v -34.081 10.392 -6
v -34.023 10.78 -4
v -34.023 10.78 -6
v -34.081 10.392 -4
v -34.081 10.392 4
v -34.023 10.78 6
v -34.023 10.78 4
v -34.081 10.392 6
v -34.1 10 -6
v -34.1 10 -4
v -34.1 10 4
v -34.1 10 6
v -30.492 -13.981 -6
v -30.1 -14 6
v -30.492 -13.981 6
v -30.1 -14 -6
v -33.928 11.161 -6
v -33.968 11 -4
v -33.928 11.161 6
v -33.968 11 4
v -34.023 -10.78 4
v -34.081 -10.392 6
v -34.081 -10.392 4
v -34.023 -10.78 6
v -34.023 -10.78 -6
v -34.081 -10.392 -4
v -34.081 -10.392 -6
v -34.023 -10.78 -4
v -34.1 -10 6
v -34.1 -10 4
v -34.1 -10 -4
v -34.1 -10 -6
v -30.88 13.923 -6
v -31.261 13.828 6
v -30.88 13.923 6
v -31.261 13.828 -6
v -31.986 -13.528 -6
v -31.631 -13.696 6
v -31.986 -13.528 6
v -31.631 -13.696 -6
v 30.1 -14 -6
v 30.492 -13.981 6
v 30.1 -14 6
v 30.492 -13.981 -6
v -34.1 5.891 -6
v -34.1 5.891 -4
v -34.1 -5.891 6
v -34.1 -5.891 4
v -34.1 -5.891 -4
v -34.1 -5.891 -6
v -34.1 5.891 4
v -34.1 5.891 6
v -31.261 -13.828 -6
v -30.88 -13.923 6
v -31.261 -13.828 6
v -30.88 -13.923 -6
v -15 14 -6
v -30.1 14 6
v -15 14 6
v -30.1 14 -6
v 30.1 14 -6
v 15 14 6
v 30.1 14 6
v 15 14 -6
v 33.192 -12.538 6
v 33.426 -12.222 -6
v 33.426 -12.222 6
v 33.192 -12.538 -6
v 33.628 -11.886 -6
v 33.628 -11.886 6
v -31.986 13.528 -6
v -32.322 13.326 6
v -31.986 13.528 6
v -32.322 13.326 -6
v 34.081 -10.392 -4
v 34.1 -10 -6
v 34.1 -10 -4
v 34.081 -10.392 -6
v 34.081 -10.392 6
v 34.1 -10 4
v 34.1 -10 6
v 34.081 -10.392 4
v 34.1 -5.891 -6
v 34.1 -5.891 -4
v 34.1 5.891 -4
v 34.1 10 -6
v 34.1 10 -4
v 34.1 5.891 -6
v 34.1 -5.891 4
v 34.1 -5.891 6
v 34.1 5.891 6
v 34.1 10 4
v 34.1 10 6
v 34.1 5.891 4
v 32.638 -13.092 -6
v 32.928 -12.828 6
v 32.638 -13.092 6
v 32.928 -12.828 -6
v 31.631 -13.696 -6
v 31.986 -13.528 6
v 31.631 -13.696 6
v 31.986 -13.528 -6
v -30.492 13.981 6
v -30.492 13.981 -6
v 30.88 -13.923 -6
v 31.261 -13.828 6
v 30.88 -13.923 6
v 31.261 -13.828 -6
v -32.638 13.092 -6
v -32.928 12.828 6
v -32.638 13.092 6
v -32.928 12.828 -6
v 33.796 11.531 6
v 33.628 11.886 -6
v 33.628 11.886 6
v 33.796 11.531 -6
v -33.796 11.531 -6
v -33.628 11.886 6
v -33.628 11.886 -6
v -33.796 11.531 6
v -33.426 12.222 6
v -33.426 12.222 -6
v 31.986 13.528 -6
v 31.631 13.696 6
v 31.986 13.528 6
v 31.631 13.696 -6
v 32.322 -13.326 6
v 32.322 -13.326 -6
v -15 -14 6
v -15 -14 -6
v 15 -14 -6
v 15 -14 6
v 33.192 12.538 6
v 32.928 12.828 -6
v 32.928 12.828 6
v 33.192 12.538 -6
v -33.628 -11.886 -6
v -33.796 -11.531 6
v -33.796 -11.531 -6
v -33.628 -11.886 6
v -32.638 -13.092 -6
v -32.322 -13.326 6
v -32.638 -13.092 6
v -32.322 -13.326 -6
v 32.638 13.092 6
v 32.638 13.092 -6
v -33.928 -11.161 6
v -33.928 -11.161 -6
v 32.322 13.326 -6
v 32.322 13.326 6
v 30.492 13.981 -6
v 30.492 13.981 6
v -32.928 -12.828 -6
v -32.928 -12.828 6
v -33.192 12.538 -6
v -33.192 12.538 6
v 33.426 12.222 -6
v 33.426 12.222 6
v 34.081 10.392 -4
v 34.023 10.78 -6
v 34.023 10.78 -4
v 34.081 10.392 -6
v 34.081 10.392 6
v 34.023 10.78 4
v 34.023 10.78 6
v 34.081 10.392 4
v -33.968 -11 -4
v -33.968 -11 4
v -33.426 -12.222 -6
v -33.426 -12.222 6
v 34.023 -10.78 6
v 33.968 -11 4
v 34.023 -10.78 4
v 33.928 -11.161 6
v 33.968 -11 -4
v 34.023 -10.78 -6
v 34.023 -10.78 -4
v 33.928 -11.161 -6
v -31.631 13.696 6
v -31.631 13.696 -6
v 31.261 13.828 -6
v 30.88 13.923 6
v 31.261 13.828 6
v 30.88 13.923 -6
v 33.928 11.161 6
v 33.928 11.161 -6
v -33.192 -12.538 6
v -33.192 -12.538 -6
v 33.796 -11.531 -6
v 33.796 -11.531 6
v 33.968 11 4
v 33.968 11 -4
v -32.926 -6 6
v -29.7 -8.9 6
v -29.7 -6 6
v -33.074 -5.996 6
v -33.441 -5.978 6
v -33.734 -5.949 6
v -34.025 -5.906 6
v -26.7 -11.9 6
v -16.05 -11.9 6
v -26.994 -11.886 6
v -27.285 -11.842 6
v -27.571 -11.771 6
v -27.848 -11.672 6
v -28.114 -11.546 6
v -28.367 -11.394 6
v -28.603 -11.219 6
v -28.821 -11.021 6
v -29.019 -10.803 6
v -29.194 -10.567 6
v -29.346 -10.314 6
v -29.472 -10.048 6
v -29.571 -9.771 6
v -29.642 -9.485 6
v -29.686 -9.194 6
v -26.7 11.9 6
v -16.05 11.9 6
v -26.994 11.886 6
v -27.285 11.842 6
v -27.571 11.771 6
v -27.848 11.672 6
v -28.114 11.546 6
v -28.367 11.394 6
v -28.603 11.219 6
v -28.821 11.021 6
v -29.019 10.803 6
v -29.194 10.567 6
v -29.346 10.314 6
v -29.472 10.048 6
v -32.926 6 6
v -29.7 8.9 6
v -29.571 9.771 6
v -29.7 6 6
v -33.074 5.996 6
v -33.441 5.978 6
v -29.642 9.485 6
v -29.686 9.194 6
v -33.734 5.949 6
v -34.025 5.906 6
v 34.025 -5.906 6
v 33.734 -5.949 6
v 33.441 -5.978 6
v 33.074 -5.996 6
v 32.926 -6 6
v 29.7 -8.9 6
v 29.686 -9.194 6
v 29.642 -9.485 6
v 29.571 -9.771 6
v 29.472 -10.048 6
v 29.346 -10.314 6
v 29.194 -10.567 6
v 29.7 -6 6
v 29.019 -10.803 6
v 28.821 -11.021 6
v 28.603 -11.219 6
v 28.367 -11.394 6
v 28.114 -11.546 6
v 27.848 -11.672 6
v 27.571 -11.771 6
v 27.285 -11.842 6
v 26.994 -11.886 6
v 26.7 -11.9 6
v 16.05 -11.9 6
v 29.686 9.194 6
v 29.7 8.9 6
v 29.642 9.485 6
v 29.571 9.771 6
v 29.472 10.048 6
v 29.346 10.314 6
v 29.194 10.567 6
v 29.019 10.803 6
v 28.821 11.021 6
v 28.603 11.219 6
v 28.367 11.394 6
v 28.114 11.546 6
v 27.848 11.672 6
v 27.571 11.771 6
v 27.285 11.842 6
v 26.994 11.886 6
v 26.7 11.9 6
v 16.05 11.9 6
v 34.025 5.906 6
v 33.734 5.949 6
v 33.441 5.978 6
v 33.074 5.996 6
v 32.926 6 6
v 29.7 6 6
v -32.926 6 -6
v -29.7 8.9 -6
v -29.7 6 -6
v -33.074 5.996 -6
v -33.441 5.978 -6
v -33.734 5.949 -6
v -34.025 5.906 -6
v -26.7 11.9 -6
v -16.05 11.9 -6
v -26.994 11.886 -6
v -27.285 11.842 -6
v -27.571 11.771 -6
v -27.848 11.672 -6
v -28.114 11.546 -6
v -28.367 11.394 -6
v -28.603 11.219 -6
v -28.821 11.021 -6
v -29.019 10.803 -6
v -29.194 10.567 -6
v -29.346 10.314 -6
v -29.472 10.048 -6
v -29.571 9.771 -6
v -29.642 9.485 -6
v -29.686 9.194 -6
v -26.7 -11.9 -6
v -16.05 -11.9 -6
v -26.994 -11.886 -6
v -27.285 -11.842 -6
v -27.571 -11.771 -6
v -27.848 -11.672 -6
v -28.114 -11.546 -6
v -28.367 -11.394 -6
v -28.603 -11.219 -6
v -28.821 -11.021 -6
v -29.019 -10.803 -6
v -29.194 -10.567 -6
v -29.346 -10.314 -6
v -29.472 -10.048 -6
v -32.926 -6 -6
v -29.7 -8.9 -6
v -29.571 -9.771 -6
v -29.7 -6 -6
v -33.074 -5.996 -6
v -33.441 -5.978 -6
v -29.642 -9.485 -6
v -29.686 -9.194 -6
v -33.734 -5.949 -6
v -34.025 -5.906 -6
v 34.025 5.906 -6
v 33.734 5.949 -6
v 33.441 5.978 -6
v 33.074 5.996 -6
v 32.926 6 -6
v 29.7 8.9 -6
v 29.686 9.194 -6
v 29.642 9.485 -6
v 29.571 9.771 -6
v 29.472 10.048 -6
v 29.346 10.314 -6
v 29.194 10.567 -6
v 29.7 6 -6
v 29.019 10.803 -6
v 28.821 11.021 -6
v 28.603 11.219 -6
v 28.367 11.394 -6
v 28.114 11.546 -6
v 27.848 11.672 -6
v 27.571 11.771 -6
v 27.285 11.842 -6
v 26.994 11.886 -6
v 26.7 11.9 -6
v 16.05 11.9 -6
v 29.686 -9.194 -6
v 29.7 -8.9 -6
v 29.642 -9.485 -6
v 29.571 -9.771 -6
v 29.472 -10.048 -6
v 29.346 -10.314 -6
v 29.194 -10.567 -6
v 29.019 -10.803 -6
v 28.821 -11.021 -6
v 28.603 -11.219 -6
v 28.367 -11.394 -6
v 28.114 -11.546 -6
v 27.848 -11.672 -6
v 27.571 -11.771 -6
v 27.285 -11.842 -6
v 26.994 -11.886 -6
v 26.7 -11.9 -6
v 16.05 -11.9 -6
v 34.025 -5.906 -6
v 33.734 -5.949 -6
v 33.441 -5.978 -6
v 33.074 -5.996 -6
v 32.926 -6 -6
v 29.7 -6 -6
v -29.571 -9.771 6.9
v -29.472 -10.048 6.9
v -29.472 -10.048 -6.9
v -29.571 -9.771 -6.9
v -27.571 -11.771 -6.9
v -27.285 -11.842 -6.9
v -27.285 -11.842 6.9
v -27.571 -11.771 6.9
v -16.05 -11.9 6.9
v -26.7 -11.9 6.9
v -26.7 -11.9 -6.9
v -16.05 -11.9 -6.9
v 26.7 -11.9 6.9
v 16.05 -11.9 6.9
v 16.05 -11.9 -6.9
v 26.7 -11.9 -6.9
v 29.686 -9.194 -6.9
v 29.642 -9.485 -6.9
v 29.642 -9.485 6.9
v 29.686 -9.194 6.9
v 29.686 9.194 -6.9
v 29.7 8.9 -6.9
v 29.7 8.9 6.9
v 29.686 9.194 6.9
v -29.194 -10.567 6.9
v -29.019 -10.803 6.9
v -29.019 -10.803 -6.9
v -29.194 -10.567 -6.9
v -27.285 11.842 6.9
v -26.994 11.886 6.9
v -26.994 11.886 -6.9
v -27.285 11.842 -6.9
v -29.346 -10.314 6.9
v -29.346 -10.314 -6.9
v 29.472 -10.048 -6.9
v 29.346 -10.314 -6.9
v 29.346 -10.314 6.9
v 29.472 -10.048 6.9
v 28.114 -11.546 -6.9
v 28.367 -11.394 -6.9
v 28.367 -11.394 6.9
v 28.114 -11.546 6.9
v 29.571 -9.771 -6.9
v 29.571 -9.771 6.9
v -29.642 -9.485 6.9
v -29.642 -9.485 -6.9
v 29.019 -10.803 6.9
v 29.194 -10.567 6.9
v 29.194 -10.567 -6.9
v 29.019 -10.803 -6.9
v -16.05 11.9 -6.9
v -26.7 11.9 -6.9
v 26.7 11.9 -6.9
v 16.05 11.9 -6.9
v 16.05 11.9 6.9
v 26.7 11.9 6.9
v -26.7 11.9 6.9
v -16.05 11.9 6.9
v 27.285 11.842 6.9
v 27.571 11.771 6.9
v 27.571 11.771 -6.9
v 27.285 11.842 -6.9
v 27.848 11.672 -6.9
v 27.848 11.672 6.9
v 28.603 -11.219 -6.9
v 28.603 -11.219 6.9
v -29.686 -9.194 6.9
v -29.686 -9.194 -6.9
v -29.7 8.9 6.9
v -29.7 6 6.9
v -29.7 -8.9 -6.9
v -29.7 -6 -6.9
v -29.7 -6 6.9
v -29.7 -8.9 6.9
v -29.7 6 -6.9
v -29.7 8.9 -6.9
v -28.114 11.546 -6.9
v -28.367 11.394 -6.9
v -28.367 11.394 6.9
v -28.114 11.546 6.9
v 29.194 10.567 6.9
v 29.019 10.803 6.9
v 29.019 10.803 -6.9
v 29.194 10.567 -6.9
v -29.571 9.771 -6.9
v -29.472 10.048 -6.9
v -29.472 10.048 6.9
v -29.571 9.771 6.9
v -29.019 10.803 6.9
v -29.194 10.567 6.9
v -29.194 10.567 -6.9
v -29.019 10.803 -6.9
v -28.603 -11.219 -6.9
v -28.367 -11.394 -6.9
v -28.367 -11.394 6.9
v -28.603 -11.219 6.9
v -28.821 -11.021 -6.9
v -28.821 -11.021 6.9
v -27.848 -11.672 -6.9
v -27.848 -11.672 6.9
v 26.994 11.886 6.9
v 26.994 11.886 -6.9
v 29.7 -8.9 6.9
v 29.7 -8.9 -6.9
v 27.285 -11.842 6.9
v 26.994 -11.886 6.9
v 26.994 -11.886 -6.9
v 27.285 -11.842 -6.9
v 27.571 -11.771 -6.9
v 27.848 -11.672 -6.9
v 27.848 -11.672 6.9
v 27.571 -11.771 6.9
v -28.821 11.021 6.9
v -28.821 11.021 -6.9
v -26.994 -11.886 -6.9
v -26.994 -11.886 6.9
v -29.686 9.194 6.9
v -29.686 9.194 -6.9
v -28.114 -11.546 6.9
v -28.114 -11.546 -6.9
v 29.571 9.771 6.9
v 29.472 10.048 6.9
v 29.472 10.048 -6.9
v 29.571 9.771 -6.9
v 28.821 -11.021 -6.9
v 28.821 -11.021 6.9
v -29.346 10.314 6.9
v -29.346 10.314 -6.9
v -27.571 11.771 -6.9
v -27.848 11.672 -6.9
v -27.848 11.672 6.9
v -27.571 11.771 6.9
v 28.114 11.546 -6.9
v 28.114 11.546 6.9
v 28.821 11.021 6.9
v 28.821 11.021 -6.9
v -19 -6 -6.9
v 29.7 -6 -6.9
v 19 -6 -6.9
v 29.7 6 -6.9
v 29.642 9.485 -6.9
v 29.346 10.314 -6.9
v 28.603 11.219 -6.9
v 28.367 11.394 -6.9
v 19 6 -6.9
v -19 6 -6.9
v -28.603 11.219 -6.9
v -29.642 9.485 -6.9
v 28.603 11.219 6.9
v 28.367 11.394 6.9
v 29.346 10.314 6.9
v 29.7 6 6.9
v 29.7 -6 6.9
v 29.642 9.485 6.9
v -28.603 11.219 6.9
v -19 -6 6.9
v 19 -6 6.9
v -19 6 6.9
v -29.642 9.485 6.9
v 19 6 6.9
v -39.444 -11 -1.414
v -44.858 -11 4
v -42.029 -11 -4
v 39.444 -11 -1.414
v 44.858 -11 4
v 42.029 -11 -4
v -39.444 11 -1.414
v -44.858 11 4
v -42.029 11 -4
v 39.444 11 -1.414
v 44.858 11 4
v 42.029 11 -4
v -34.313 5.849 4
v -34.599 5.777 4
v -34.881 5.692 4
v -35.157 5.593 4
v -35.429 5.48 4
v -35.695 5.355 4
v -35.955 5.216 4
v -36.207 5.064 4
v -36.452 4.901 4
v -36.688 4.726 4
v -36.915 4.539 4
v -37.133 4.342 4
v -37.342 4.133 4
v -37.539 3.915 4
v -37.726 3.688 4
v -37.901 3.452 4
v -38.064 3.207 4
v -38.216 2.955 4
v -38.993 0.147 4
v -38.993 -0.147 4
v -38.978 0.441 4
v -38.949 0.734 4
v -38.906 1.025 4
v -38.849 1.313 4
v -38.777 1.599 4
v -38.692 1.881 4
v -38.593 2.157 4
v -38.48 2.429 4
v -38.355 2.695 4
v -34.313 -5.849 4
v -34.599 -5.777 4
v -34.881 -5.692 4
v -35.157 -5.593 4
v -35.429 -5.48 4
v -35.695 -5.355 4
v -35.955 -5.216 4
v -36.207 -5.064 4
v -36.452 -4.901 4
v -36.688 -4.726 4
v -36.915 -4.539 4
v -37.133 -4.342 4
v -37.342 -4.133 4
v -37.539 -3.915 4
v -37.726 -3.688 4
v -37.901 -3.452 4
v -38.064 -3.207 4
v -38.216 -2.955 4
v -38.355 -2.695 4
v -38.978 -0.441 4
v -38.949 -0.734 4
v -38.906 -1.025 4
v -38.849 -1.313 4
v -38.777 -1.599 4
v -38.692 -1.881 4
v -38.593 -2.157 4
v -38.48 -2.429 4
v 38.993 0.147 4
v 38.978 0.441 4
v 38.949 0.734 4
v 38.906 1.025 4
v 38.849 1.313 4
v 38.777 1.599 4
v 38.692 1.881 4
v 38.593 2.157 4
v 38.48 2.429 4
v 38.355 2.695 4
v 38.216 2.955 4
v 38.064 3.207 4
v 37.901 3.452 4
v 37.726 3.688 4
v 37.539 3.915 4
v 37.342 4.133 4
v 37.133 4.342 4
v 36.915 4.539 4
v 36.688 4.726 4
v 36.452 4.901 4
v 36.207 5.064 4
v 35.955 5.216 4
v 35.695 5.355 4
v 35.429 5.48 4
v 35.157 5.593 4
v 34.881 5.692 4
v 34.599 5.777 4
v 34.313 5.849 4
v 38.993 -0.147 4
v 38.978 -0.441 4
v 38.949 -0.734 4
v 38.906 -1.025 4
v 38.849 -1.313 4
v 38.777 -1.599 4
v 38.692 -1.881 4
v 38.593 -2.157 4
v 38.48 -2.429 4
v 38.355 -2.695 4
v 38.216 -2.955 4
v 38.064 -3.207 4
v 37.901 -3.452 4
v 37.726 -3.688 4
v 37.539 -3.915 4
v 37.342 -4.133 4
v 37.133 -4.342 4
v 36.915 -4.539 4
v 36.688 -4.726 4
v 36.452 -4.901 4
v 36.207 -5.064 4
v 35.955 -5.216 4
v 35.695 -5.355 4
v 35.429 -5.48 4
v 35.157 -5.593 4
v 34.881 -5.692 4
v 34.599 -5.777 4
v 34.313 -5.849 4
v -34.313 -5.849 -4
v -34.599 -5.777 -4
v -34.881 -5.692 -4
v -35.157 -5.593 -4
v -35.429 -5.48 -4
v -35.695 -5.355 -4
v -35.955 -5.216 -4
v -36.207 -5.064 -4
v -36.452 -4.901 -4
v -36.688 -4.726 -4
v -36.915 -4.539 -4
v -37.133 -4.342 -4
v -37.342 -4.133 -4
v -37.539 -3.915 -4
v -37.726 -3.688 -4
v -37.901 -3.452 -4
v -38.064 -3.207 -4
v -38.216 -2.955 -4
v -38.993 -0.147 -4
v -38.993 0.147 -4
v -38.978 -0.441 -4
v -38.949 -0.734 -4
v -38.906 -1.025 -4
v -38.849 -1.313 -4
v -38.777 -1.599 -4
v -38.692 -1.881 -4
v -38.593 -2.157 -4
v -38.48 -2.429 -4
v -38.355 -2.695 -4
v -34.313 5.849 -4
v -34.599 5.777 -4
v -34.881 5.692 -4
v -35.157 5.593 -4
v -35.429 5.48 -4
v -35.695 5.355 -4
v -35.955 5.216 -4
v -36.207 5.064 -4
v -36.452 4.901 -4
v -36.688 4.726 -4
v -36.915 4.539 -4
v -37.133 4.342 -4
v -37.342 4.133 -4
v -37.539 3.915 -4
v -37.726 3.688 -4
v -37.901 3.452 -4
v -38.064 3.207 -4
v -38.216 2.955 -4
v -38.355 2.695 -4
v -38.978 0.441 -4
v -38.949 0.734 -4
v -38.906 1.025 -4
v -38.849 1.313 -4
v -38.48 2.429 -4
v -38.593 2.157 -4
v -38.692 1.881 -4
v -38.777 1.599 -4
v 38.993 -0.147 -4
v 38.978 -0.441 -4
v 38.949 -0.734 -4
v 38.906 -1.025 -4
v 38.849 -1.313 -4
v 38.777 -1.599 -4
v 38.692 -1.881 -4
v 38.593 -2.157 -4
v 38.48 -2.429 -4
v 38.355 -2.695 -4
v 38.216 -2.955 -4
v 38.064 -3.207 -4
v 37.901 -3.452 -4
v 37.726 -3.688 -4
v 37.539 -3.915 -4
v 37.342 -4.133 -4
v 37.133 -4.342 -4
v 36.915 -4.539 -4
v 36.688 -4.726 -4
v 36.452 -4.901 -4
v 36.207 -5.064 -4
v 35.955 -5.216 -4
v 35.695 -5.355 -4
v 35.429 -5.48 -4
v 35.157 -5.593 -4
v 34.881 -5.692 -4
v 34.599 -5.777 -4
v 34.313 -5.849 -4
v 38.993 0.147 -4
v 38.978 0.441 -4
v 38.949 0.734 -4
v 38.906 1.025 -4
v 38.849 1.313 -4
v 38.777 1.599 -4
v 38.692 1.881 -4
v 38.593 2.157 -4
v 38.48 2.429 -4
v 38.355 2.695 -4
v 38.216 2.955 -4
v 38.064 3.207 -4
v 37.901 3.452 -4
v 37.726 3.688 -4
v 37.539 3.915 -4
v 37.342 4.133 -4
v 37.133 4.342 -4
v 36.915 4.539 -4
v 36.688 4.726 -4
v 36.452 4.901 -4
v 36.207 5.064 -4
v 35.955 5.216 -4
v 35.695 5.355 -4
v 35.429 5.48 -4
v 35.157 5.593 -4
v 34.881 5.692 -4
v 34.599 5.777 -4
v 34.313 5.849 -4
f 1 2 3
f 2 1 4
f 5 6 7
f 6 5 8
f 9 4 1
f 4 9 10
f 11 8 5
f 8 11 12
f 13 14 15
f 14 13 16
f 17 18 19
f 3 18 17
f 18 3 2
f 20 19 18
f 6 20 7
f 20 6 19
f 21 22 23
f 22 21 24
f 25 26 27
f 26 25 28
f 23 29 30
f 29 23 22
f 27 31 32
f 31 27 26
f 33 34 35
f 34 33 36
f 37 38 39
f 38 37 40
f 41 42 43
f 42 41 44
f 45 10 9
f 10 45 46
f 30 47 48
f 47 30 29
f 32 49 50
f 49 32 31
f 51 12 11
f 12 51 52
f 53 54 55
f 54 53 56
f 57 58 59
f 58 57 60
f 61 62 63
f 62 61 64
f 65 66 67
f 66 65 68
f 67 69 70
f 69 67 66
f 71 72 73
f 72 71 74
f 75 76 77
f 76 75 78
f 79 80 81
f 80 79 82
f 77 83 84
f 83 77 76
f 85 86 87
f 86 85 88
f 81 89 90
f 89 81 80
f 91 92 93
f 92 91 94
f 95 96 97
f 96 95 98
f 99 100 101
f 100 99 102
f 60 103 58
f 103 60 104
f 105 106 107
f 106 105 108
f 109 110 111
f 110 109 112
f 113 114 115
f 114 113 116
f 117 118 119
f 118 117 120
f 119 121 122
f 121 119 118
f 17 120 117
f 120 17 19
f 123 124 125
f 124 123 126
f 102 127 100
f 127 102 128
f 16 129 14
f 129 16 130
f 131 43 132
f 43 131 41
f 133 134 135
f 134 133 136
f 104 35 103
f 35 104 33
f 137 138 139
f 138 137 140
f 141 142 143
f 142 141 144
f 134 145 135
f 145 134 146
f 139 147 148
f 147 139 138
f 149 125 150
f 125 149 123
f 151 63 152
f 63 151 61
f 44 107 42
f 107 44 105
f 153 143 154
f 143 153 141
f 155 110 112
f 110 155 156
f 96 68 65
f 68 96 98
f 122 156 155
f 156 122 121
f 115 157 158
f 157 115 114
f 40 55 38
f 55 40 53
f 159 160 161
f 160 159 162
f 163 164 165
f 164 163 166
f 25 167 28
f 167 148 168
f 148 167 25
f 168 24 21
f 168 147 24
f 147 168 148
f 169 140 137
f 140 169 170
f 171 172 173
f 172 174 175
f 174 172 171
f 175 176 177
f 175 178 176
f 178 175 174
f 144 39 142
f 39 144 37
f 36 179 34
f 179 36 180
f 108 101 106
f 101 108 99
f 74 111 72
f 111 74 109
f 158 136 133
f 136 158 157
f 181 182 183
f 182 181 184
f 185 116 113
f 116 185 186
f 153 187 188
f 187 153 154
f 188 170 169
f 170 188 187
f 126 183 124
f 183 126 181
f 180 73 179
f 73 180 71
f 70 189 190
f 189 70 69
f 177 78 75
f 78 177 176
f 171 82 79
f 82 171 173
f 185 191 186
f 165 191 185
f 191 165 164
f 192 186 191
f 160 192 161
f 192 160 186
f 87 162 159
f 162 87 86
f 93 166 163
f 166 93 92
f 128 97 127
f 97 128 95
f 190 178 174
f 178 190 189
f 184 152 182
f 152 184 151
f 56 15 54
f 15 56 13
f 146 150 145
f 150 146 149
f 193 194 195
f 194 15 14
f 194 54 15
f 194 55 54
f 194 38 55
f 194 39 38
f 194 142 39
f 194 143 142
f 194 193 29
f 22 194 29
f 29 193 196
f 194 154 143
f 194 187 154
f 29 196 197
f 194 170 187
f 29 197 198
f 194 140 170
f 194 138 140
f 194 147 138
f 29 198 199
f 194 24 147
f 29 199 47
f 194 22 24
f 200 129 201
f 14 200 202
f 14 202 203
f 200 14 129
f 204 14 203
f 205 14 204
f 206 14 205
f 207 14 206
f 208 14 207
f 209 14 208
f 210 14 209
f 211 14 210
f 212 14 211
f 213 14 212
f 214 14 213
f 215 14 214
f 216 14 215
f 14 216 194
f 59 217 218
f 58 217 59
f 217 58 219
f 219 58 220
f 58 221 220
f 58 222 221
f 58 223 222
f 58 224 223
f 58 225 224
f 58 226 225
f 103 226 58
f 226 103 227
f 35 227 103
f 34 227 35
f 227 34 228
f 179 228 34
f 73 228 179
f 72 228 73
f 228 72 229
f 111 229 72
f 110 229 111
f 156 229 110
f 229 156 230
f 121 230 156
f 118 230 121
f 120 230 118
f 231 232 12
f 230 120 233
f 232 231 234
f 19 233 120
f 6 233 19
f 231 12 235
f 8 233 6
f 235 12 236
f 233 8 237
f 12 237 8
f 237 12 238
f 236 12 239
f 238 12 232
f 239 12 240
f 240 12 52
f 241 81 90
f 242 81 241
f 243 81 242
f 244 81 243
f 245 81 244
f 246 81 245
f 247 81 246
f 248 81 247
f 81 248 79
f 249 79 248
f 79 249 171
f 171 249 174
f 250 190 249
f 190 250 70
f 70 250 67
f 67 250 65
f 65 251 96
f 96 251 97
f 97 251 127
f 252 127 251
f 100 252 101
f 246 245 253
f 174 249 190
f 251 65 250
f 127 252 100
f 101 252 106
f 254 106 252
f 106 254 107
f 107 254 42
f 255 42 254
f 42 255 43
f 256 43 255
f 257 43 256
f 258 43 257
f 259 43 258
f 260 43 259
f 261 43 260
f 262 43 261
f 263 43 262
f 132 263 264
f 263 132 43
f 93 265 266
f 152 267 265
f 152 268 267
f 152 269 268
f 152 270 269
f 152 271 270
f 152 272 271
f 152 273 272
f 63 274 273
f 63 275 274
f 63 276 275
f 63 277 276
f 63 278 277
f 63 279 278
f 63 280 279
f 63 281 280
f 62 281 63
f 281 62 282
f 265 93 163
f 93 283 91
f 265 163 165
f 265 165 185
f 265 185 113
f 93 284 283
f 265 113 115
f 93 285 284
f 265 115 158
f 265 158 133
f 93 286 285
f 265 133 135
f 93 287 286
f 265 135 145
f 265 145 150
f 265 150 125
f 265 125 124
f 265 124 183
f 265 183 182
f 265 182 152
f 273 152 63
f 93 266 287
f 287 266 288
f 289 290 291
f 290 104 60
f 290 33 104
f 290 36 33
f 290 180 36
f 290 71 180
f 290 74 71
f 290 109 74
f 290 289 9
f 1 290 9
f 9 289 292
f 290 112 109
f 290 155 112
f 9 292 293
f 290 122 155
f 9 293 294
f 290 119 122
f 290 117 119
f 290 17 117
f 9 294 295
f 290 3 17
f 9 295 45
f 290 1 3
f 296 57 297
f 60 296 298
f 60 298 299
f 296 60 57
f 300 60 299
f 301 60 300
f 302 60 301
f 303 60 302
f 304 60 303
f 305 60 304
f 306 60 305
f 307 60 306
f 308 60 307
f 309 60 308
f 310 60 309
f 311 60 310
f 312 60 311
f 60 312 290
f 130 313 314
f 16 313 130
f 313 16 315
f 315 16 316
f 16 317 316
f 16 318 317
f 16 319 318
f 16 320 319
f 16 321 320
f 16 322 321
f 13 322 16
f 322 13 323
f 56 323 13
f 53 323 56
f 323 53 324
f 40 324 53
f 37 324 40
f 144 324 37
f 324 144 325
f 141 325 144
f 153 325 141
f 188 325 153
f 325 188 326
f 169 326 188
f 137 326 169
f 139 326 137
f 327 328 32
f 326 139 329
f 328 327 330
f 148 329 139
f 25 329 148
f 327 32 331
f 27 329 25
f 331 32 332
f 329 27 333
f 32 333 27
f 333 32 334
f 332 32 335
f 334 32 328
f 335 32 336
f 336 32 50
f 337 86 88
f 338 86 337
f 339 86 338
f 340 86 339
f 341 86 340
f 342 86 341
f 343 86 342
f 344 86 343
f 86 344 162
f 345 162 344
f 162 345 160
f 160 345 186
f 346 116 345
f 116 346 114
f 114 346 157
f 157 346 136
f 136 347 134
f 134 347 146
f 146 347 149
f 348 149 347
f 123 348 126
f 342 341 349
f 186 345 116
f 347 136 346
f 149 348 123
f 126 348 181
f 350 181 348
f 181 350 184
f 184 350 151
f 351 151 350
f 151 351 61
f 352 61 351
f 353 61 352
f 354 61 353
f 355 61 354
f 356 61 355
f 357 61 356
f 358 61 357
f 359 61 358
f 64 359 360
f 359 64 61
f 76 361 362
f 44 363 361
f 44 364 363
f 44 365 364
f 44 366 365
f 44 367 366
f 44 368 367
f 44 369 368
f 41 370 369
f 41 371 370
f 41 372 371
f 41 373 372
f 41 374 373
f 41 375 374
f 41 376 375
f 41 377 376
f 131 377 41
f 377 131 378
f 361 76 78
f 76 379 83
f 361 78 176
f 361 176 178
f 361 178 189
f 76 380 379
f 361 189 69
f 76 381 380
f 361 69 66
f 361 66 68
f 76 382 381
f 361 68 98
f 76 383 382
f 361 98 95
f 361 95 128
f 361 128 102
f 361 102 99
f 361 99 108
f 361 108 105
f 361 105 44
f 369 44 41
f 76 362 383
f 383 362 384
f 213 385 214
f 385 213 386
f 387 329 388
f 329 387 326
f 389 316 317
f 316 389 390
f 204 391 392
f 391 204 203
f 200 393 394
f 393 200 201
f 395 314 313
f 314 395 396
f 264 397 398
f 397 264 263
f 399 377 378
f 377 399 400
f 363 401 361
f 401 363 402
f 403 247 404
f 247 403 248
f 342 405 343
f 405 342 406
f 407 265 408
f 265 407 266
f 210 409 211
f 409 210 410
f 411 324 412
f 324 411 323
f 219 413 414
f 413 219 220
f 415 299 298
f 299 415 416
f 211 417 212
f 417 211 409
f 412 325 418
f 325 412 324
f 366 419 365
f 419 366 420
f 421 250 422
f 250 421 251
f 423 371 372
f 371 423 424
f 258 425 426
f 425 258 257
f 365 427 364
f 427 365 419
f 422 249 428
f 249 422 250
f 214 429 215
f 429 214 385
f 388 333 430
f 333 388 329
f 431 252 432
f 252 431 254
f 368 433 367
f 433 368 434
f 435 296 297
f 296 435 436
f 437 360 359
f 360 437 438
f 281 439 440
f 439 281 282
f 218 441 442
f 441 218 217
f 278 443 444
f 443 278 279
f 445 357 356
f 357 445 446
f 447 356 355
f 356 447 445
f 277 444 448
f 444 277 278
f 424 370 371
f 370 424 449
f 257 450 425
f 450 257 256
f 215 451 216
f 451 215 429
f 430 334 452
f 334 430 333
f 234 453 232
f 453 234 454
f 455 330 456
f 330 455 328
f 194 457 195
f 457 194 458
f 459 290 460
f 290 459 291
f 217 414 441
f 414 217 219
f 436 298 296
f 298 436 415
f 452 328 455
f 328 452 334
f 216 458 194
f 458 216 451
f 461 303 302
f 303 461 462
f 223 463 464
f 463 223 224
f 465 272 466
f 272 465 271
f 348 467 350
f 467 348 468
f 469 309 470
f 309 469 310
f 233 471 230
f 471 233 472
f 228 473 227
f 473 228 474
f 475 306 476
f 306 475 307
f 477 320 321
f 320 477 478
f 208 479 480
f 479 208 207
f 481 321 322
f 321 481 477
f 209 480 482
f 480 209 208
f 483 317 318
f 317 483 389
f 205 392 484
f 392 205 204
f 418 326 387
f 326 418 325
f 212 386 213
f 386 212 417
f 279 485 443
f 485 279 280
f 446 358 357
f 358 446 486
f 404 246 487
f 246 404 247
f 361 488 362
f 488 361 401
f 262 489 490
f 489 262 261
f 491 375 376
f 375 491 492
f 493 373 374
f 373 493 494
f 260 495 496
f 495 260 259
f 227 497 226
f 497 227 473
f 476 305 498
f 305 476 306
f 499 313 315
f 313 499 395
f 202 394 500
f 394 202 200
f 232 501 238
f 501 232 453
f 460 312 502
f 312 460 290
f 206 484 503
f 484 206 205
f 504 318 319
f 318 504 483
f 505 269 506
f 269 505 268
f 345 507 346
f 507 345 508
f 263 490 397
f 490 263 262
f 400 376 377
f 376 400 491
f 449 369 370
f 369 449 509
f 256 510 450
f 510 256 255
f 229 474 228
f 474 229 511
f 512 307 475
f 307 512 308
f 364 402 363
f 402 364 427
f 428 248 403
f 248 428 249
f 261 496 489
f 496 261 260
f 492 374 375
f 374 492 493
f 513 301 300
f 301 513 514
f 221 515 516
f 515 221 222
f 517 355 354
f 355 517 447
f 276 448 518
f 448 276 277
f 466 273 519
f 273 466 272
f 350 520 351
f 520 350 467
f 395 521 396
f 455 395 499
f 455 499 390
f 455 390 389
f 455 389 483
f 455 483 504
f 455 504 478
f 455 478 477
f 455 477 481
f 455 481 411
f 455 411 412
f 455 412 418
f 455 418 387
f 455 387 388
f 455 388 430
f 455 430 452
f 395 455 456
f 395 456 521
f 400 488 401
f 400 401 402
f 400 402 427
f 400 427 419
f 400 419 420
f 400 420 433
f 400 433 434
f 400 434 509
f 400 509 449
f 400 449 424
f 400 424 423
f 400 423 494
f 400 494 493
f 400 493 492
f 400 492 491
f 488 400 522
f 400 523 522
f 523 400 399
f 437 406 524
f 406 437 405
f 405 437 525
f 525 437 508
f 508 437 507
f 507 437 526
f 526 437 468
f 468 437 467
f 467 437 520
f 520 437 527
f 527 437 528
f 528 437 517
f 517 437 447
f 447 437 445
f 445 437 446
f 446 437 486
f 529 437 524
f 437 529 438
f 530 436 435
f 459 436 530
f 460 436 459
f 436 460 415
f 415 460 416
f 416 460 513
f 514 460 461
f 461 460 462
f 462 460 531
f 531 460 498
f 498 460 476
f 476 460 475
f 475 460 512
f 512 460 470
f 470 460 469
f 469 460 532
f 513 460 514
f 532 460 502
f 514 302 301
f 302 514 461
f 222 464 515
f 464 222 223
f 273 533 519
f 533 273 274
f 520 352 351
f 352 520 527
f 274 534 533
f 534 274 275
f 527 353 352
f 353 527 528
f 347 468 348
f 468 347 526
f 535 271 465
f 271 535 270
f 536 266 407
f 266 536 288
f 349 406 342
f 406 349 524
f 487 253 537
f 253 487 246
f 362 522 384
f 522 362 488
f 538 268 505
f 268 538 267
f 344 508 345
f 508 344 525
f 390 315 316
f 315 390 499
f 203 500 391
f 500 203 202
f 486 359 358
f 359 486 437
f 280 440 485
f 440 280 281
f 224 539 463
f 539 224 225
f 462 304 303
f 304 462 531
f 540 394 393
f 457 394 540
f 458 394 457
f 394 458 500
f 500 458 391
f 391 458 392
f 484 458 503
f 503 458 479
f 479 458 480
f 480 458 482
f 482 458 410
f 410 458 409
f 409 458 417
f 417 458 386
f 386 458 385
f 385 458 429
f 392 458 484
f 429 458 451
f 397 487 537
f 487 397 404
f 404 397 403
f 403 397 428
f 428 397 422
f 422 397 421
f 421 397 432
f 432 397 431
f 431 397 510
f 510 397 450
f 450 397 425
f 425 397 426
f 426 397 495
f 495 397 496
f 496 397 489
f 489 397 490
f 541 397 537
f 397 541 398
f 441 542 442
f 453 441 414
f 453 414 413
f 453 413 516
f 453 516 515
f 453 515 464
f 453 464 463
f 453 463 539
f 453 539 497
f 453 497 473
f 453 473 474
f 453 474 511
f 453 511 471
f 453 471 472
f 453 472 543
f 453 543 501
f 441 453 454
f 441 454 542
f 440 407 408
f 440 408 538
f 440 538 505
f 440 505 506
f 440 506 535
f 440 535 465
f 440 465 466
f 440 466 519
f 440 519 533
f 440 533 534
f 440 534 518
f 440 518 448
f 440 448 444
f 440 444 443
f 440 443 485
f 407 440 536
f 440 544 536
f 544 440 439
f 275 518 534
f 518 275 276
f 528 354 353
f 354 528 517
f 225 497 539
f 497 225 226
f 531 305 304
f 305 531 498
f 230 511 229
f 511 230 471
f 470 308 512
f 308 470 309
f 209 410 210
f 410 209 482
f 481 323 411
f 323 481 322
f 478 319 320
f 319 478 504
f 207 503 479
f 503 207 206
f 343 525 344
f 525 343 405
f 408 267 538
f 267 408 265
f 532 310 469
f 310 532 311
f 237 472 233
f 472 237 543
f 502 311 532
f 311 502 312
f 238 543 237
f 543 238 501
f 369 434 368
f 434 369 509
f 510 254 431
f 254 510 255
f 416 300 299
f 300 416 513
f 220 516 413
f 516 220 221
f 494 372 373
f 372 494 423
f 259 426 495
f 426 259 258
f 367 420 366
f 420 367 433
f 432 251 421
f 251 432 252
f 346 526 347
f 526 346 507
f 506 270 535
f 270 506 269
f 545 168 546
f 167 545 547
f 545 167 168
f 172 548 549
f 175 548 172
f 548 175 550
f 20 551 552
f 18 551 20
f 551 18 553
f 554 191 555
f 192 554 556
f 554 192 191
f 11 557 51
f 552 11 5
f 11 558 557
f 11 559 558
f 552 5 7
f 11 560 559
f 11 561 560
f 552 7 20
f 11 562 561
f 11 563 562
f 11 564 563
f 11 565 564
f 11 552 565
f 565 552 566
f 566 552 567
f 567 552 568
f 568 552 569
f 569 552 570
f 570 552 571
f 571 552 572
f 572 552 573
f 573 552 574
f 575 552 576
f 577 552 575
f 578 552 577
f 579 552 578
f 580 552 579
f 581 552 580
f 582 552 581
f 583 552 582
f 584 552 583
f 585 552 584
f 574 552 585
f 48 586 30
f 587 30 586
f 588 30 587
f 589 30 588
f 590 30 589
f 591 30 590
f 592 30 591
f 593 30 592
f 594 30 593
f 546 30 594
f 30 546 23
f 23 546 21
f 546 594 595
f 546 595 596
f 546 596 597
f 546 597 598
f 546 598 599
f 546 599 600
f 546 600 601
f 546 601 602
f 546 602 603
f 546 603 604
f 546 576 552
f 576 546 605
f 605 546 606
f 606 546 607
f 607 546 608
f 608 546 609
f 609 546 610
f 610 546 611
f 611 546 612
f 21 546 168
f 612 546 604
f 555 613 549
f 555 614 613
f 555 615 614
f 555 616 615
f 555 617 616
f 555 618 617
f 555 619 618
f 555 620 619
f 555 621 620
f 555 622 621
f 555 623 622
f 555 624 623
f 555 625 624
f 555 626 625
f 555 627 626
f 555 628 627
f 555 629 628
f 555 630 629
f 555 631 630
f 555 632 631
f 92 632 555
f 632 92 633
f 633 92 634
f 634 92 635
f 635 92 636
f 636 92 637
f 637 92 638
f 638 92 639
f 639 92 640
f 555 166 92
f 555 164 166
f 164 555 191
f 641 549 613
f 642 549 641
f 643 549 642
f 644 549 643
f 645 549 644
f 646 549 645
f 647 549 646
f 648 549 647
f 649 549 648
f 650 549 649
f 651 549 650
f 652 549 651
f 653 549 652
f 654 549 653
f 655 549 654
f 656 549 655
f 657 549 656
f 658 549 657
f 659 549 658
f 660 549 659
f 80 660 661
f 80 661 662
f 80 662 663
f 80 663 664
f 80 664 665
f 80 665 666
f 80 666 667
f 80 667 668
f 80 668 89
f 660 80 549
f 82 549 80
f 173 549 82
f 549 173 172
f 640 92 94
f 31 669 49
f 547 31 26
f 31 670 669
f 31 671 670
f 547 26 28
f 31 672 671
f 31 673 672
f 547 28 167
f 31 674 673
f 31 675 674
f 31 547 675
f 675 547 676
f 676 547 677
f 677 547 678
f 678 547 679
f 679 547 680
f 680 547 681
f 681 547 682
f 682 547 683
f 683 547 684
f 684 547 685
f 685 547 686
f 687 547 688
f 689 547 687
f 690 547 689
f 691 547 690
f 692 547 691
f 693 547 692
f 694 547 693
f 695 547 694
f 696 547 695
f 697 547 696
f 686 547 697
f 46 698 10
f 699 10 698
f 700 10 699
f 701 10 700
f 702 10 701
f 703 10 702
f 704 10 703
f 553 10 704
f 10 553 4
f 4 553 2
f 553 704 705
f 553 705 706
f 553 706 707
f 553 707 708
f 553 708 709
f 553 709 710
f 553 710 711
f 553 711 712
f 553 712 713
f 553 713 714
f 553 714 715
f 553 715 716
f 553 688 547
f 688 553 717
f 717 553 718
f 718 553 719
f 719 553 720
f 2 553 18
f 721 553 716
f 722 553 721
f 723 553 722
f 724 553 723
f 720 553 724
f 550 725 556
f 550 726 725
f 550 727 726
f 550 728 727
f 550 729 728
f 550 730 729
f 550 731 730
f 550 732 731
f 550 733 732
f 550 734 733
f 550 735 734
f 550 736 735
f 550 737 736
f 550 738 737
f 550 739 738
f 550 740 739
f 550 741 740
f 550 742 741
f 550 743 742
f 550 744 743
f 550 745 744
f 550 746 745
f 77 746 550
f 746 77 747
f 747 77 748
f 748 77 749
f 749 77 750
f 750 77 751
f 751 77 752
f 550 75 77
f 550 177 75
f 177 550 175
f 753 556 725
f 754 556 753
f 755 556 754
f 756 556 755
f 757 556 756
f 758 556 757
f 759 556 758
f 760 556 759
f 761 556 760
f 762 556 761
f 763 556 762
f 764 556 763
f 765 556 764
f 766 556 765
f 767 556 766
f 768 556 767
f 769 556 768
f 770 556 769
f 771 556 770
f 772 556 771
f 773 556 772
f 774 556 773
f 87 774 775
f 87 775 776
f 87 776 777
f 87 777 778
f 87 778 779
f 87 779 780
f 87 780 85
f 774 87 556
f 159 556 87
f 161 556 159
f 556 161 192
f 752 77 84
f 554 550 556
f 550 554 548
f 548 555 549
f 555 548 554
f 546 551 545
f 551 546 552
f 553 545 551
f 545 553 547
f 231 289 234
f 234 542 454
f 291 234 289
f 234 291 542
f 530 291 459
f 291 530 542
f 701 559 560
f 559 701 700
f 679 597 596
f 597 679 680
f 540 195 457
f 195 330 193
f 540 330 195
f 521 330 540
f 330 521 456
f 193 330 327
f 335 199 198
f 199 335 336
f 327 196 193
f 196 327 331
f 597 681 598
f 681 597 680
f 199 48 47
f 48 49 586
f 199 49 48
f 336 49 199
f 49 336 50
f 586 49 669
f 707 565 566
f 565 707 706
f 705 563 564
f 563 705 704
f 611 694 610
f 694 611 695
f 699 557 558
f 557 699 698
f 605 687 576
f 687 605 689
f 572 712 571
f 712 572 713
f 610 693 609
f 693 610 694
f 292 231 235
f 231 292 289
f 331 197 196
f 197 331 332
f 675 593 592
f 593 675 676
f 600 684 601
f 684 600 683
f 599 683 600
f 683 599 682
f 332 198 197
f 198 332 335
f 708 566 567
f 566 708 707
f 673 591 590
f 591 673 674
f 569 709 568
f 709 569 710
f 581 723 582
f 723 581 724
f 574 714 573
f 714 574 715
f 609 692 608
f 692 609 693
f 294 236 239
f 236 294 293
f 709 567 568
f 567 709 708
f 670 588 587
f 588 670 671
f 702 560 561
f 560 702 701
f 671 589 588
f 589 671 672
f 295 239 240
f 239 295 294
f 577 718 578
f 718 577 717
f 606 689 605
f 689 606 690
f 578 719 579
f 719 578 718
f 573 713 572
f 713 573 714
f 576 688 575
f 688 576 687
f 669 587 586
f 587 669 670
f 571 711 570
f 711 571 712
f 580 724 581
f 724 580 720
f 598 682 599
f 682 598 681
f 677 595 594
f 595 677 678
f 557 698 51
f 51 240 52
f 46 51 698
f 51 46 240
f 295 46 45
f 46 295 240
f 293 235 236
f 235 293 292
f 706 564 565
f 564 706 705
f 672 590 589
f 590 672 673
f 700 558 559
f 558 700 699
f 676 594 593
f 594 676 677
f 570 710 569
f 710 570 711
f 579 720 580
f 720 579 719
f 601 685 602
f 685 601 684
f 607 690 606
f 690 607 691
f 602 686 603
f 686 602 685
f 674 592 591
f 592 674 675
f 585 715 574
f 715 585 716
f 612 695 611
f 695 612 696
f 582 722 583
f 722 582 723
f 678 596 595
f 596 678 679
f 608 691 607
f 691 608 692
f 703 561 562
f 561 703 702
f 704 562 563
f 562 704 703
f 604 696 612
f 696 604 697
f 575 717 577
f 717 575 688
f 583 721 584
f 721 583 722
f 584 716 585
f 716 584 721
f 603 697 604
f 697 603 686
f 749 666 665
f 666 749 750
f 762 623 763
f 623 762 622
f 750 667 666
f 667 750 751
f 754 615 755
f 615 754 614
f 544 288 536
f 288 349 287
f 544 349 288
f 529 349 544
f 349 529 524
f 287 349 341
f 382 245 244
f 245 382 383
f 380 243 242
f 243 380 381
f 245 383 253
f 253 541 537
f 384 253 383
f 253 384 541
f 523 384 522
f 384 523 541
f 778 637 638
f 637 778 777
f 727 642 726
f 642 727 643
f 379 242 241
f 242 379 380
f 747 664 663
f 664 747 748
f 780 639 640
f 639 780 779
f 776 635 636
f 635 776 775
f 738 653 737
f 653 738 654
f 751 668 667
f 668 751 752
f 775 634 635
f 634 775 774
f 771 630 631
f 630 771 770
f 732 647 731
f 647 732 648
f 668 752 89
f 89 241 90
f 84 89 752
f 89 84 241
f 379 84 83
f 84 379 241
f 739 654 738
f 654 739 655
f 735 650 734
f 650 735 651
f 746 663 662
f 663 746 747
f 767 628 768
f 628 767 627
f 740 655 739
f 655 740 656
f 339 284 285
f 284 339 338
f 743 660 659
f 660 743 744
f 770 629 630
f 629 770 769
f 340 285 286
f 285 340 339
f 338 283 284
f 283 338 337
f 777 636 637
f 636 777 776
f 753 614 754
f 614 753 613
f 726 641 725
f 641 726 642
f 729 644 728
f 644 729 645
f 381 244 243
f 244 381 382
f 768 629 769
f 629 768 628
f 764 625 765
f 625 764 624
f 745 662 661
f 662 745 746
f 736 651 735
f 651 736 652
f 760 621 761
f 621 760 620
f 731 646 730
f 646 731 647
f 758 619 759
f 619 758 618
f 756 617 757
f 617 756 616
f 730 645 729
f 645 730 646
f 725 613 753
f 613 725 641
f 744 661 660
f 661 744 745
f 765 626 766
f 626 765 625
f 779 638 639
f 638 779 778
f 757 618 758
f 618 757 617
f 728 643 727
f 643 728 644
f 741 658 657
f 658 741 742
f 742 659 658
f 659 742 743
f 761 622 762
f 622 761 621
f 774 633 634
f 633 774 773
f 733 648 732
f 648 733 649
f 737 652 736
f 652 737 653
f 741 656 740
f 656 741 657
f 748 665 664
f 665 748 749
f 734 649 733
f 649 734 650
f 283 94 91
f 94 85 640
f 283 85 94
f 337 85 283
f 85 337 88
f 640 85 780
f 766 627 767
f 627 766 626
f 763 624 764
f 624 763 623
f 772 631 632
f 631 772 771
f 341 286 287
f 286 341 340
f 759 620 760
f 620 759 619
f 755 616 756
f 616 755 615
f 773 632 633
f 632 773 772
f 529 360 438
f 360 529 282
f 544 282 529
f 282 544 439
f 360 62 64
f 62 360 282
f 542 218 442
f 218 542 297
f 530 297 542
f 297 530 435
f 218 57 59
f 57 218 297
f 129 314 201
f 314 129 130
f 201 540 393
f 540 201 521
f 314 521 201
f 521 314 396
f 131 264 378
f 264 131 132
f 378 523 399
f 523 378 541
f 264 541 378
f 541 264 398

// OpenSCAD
$fn=64;

L = 120;
W = 22;
T = 8;

midL = 44;
midW = 28;
midT = 12;

endChamfer = 10;

holeD = 6;
holeInset = 12;

winL = 34;
winW = 12;
winR = 3;
winZ = 0;

win1x = -22;
win2x = 22;

module rounded_box(size=[10,10,10], r=2, center=true){
    sx = size[0]; sy = size[1]; sz = size[2];
    rr = min(r, min(sx, sy)/2);
    translate(center ? [-sx/2, -sy/2, -sz/2] : [0,0,0])
    linear_extrude(height=sz)
        offset(r=rr)
            offset(delta=-rr)
                square([sx, sy], center=false);
}

module capsule2d(len=20, wid=10){
    r = wid/2;
    hull(){
        translate([-len/2 + r, 0]) circle(r=r);
        translate([ len/2 - r, 0]) circle(r=r);
    }
}

module window_cut(len=30, wid=10, r=2, h=50){
    linear_extrude(height=h, center=true)
        offset(r=r)
            offset(delta=-r)
                capsule2d(len=len, wid=wid);
}

module end_hole(xpos){
    translate([xpos, 0, 0])
        rotate([90,0,0])
            cylinder(d=holeD, h=200, center=true);
}

module chamfer_ends(){
    union(){
        translate([ L/2 - endChamfer/2, 0, 0])
            rotate([0,45,0])
                cube([endChamfer*2, W*3, T*3], center=true);
        translate([-L/2 + endChamfer/2, 0, 0])
            rotate([0,-45,0])
                cube([endChamfer*2, W*3, T*3], center=true);
    }
}

module mid_facets(){
    union(){
        translate([0, 0, 0])
            hull(){
                translate([-midL/2, 0, 0]) rounded_box([midL*0.55, midW, midT], r=4, center=true);
                translate([ midL/2, 0, 0]) rounded_box([midL*0.55, midW, midT], r=4, center=true);
            }
        translate([0, 0, 0])
            hull(){
                translate([-midL/2, 0, 0]) rounded_box([midL*0.35, midW*0.85, midT*1.15], r=3, center=true);
                translate([ midL/2, 0, 0]) rounded_box([midL*0.35, midW*0.85, midT*1.15], r=3, center=true);
            }
    }
}

module main_body(){
    union(){
        hull(){
            translate([-L/2 + endChamfer, 0, 0]) rounded_box([W, W, T], r=5, center=true);
            translate([ L/2 - endChamfer, 0, 0]) rounded_box([W, W, T], r=5, center=true);
        }
        mid_facets();
    }
}

difference(){
    intersection(){
        main_body();
        difference(){
            cube([L*2, W*4, T*4], center=true);
            chamfer_ends();
        }
    }

    translate([win1x, 0, winZ]) window_cut(len=winL, wid=winW, r=winR, h=T*4);
    translate([win2x, 0, winZ]) window_cut(len=winL, wid=winW, r=winR, h=T*4);

    end_hole(-L/2 + holeInset);
    end_hole( L/2 - holeInset);

    translate([0, 0, 0])
        rotate([0,0,0])
            linear_extrude(height=T*4, center=true)
                polygon(points=[
                    [-midL/2, 0],
                    [-midL/2 + 10,  midW/2 + 6],
                    [ midL/2 - 10,  midW/2 + 6],
                    [ midL/2, 0],
                    [ midL/2 - 10, -midW/2 - 6],
                    [-midL/2 + 10, -midW/2 - 6]
                ]);
}
